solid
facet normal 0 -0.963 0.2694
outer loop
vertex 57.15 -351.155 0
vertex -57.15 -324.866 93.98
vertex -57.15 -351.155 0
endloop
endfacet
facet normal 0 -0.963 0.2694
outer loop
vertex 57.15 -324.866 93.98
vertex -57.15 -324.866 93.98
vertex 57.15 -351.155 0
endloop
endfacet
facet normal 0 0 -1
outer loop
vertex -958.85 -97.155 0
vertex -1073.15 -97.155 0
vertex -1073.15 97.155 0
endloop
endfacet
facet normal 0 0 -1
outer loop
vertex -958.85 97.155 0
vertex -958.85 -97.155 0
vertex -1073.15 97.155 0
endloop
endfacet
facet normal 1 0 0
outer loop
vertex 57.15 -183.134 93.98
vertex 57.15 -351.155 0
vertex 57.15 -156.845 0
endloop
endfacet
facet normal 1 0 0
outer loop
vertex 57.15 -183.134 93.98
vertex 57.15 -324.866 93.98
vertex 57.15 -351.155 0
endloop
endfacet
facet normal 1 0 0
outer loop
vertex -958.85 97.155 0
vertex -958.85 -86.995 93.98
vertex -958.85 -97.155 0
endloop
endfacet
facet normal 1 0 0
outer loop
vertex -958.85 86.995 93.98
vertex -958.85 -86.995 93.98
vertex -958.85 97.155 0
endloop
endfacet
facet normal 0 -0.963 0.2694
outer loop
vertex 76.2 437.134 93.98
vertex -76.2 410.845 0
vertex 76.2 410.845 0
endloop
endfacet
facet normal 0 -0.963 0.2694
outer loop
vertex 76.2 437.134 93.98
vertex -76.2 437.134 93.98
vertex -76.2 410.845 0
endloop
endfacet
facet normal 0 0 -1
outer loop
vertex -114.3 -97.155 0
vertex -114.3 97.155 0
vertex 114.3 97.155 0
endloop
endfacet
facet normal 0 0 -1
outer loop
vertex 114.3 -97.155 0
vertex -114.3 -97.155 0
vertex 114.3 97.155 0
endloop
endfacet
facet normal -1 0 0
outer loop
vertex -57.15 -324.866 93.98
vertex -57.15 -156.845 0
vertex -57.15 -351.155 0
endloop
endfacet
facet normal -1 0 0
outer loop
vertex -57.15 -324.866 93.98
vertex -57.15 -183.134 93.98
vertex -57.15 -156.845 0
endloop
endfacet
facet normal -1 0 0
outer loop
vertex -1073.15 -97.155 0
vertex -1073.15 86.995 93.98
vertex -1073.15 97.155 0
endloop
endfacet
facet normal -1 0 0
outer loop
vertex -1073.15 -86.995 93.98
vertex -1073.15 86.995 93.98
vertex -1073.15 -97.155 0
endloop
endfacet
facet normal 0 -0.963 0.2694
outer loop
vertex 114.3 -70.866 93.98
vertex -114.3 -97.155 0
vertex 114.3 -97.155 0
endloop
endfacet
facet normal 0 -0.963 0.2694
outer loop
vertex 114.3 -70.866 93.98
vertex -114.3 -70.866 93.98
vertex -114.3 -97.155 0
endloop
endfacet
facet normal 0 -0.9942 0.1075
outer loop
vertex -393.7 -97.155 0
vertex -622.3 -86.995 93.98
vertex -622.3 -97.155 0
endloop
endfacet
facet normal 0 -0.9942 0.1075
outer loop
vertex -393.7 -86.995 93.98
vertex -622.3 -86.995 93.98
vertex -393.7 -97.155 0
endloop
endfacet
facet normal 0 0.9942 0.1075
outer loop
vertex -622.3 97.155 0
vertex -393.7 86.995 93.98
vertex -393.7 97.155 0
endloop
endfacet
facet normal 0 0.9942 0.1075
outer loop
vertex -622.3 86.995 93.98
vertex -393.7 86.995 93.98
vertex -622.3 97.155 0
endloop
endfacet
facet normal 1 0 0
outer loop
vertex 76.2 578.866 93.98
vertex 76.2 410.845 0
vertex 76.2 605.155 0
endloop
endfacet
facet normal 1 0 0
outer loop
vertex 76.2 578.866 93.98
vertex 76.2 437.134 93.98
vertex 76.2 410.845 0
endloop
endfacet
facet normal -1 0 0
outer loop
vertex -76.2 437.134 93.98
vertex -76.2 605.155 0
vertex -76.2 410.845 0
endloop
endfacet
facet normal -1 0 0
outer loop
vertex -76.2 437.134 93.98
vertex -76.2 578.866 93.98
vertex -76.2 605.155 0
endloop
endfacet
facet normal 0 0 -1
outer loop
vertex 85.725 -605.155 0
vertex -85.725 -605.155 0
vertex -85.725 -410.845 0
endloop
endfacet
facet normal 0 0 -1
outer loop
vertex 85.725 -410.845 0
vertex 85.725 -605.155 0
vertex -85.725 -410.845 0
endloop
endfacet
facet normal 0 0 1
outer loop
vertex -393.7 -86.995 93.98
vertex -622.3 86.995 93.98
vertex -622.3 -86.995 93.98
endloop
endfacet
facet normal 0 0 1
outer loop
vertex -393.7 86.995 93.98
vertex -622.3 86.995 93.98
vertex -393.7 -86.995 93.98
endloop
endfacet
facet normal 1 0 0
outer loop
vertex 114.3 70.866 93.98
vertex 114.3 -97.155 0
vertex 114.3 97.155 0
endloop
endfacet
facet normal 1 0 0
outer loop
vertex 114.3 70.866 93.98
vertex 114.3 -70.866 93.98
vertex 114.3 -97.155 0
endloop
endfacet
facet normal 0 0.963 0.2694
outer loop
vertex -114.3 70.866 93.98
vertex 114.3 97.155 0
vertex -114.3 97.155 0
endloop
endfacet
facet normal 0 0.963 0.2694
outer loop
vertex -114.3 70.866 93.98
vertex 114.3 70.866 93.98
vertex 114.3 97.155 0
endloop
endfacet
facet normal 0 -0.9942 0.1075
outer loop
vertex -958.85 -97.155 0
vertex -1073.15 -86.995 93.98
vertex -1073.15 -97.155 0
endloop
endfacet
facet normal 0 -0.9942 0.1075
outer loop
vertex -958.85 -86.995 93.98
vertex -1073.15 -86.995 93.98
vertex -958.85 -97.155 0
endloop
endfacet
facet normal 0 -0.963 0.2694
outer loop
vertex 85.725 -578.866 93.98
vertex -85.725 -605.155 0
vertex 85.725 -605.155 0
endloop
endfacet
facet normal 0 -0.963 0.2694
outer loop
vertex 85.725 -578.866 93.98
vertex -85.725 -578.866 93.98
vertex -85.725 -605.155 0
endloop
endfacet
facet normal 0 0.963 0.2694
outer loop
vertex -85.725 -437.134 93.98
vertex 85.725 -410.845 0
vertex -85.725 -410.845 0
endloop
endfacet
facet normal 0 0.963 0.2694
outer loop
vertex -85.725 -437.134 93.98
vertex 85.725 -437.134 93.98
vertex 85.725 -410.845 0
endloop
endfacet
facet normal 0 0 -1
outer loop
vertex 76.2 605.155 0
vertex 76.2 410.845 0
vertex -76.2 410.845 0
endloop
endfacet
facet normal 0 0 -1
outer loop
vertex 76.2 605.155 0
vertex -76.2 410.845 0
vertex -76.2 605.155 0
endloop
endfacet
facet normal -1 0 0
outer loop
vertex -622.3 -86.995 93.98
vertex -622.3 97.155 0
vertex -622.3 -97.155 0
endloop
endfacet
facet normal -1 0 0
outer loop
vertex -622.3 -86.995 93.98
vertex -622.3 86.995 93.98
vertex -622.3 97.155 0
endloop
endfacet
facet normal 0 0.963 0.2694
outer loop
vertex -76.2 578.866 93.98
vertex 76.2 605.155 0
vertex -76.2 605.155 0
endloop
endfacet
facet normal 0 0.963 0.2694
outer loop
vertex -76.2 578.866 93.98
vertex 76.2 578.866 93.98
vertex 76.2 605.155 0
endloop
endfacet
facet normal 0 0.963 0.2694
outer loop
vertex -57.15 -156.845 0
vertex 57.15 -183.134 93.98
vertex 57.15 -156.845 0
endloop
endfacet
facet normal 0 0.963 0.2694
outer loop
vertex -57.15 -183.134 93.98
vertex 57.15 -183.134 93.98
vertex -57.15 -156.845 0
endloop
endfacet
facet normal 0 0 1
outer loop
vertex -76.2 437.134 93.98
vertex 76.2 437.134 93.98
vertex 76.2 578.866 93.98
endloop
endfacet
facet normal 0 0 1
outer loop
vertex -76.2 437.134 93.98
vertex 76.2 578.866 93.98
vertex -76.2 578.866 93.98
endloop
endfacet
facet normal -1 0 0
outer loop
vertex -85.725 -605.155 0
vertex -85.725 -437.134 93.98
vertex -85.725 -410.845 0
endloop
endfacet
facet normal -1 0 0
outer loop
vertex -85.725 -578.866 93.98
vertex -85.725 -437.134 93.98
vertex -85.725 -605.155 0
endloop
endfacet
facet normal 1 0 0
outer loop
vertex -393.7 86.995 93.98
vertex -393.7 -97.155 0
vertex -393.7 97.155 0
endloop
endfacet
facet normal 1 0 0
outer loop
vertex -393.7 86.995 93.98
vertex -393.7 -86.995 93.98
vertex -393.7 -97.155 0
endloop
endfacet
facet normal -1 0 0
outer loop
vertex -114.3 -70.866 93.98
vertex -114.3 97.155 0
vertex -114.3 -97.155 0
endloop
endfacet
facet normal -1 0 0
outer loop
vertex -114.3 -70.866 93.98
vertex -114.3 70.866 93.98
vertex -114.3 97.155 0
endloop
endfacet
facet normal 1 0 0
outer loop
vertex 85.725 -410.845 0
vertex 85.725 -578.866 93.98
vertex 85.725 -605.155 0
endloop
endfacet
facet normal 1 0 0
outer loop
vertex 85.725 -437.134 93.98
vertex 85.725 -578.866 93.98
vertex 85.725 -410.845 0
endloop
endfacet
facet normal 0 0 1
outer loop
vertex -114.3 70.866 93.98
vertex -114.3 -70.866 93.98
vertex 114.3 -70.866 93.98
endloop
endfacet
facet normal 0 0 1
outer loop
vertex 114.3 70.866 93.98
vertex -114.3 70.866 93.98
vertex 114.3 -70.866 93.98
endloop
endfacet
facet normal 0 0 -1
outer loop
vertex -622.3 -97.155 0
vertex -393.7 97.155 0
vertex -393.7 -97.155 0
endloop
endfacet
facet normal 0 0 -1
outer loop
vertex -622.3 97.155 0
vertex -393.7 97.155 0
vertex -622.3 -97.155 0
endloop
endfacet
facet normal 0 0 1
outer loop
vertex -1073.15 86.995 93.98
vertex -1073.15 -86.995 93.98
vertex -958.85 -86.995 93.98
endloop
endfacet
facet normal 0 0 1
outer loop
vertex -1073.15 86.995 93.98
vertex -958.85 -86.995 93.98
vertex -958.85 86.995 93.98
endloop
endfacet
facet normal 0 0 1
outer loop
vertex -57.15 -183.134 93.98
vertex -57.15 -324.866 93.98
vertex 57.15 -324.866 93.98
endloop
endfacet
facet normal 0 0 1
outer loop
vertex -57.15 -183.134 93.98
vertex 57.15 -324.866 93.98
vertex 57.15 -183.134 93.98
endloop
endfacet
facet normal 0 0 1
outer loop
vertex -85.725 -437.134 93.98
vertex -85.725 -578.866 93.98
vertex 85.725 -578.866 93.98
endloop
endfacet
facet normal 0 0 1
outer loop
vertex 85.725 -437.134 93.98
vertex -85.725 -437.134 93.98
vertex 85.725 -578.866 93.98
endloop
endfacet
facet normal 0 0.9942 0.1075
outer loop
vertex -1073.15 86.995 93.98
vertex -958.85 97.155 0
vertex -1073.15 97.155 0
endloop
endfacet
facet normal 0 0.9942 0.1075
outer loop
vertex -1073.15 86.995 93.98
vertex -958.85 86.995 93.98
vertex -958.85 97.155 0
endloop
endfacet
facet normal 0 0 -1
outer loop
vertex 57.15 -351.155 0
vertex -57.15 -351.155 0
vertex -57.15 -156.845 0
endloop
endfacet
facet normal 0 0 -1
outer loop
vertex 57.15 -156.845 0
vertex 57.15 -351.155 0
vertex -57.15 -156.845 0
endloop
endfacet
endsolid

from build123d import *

# Parameters (mm, degrees)
F0_W   = 228.6
F0_H   = 194.31
F2_W   = 228.6
F2_H   = 141.732
F0_W_2 = 114.3
F2_W_2 = 114.3
F0_W_3 = 171.45
F2_W_3 = 171.45
F2_H_2 = 173.99


with BuildPart() as f3:
    # F0 (on Top) → F3 section 0
    with BuildSketch(Plane.XY):
        Rectangle(F0_W, F0_H)
    # F2 (on offset) → F3 section 1
    with BuildSketch(Plane.XY.offset(93.98)):
        Rectangle(F2_W, F2_H)
    loft()


with BuildPart() as f4:
    # F0 (on Top) → F4 section 0
    with BuildSketch(Plane.XY):
        with Locations((0, -254)):
            Rectangle(F0_W_2, F0_H)
    # F2 (on offset) → F4 section 1
    with BuildSketch(Plane.XY.offset(93.98)):
        with Locations((0, -254)):
            Rectangle(F2_W_2, F2_H)
    loft()


with BuildPart() as f5:
    # F0 (on Top) → F5 section 0
    with BuildSketch(Plane.XY):
        with Locations((0, -508)):
            Rectangle(F0_W_3, F0_H)
    # F2 (on offset) → F5 section 1
    with BuildSketch(Plane.XY.offset(93.98)):
        with Locations((0, -508)):
            Rectangle(F2_W_3, F2_H)
    loft()


with BuildPart() as f6:
    # F0 (on Top) → F6 section 0
    with BuildSketch(Plane.XY):
        Polygon((0, 410.845), (76.2, 410.845), (76.2, 605.155), (-76.2, 605.155), (-76.2, 410.845), align=None)
    # F2 (on offset) → F6 section 1
    with BuildSketch(Plane.XY.offset(93.98)):
        Polygon((0, 437.134), (76.2, 437.134), (76.2, 578.866), (-76.2, 578.866), (-76.2, 437.134), align=None)
    loft()


with BuildPart() as f7:
    # F0 (on Top) → F7 section 0
    with BuildSketch(Plane.XY):
        Polygon((-393.7, 97.155), (-622.3, 97.155), (-622.3, 86.995), (-622.3, -86.995), (-622.3, -92.075), (-622.3, -97.155), (-393.7, -97.155), align=None)
    # F2 (on offset) → F7 section 1
    with BuildSketch(Plane.XY.offset(93.98)):
        with Locations((-508, 0)):
            Rectangle(F2_W, F2_H_2)
    loft()


with BuildPart() as f8:
    # F0 (on Top) → F8 section 0
    with BuildSketch(Plane.XY):
        with Locations((-1016, 0)):
            Rectangle(F0_W_2, F0_H)
    # F2 (on offset) → F8 section 1
    with BuildSketch(Plane.XY.offset(93.98)):
        with Locations((-1016, 0)):
            Rectangle(F2_W_2, F2_H_2)
    loft()


solid = Compound([f3.part, f4.part, f5.part, f6.part, f7.part, f8.part])
